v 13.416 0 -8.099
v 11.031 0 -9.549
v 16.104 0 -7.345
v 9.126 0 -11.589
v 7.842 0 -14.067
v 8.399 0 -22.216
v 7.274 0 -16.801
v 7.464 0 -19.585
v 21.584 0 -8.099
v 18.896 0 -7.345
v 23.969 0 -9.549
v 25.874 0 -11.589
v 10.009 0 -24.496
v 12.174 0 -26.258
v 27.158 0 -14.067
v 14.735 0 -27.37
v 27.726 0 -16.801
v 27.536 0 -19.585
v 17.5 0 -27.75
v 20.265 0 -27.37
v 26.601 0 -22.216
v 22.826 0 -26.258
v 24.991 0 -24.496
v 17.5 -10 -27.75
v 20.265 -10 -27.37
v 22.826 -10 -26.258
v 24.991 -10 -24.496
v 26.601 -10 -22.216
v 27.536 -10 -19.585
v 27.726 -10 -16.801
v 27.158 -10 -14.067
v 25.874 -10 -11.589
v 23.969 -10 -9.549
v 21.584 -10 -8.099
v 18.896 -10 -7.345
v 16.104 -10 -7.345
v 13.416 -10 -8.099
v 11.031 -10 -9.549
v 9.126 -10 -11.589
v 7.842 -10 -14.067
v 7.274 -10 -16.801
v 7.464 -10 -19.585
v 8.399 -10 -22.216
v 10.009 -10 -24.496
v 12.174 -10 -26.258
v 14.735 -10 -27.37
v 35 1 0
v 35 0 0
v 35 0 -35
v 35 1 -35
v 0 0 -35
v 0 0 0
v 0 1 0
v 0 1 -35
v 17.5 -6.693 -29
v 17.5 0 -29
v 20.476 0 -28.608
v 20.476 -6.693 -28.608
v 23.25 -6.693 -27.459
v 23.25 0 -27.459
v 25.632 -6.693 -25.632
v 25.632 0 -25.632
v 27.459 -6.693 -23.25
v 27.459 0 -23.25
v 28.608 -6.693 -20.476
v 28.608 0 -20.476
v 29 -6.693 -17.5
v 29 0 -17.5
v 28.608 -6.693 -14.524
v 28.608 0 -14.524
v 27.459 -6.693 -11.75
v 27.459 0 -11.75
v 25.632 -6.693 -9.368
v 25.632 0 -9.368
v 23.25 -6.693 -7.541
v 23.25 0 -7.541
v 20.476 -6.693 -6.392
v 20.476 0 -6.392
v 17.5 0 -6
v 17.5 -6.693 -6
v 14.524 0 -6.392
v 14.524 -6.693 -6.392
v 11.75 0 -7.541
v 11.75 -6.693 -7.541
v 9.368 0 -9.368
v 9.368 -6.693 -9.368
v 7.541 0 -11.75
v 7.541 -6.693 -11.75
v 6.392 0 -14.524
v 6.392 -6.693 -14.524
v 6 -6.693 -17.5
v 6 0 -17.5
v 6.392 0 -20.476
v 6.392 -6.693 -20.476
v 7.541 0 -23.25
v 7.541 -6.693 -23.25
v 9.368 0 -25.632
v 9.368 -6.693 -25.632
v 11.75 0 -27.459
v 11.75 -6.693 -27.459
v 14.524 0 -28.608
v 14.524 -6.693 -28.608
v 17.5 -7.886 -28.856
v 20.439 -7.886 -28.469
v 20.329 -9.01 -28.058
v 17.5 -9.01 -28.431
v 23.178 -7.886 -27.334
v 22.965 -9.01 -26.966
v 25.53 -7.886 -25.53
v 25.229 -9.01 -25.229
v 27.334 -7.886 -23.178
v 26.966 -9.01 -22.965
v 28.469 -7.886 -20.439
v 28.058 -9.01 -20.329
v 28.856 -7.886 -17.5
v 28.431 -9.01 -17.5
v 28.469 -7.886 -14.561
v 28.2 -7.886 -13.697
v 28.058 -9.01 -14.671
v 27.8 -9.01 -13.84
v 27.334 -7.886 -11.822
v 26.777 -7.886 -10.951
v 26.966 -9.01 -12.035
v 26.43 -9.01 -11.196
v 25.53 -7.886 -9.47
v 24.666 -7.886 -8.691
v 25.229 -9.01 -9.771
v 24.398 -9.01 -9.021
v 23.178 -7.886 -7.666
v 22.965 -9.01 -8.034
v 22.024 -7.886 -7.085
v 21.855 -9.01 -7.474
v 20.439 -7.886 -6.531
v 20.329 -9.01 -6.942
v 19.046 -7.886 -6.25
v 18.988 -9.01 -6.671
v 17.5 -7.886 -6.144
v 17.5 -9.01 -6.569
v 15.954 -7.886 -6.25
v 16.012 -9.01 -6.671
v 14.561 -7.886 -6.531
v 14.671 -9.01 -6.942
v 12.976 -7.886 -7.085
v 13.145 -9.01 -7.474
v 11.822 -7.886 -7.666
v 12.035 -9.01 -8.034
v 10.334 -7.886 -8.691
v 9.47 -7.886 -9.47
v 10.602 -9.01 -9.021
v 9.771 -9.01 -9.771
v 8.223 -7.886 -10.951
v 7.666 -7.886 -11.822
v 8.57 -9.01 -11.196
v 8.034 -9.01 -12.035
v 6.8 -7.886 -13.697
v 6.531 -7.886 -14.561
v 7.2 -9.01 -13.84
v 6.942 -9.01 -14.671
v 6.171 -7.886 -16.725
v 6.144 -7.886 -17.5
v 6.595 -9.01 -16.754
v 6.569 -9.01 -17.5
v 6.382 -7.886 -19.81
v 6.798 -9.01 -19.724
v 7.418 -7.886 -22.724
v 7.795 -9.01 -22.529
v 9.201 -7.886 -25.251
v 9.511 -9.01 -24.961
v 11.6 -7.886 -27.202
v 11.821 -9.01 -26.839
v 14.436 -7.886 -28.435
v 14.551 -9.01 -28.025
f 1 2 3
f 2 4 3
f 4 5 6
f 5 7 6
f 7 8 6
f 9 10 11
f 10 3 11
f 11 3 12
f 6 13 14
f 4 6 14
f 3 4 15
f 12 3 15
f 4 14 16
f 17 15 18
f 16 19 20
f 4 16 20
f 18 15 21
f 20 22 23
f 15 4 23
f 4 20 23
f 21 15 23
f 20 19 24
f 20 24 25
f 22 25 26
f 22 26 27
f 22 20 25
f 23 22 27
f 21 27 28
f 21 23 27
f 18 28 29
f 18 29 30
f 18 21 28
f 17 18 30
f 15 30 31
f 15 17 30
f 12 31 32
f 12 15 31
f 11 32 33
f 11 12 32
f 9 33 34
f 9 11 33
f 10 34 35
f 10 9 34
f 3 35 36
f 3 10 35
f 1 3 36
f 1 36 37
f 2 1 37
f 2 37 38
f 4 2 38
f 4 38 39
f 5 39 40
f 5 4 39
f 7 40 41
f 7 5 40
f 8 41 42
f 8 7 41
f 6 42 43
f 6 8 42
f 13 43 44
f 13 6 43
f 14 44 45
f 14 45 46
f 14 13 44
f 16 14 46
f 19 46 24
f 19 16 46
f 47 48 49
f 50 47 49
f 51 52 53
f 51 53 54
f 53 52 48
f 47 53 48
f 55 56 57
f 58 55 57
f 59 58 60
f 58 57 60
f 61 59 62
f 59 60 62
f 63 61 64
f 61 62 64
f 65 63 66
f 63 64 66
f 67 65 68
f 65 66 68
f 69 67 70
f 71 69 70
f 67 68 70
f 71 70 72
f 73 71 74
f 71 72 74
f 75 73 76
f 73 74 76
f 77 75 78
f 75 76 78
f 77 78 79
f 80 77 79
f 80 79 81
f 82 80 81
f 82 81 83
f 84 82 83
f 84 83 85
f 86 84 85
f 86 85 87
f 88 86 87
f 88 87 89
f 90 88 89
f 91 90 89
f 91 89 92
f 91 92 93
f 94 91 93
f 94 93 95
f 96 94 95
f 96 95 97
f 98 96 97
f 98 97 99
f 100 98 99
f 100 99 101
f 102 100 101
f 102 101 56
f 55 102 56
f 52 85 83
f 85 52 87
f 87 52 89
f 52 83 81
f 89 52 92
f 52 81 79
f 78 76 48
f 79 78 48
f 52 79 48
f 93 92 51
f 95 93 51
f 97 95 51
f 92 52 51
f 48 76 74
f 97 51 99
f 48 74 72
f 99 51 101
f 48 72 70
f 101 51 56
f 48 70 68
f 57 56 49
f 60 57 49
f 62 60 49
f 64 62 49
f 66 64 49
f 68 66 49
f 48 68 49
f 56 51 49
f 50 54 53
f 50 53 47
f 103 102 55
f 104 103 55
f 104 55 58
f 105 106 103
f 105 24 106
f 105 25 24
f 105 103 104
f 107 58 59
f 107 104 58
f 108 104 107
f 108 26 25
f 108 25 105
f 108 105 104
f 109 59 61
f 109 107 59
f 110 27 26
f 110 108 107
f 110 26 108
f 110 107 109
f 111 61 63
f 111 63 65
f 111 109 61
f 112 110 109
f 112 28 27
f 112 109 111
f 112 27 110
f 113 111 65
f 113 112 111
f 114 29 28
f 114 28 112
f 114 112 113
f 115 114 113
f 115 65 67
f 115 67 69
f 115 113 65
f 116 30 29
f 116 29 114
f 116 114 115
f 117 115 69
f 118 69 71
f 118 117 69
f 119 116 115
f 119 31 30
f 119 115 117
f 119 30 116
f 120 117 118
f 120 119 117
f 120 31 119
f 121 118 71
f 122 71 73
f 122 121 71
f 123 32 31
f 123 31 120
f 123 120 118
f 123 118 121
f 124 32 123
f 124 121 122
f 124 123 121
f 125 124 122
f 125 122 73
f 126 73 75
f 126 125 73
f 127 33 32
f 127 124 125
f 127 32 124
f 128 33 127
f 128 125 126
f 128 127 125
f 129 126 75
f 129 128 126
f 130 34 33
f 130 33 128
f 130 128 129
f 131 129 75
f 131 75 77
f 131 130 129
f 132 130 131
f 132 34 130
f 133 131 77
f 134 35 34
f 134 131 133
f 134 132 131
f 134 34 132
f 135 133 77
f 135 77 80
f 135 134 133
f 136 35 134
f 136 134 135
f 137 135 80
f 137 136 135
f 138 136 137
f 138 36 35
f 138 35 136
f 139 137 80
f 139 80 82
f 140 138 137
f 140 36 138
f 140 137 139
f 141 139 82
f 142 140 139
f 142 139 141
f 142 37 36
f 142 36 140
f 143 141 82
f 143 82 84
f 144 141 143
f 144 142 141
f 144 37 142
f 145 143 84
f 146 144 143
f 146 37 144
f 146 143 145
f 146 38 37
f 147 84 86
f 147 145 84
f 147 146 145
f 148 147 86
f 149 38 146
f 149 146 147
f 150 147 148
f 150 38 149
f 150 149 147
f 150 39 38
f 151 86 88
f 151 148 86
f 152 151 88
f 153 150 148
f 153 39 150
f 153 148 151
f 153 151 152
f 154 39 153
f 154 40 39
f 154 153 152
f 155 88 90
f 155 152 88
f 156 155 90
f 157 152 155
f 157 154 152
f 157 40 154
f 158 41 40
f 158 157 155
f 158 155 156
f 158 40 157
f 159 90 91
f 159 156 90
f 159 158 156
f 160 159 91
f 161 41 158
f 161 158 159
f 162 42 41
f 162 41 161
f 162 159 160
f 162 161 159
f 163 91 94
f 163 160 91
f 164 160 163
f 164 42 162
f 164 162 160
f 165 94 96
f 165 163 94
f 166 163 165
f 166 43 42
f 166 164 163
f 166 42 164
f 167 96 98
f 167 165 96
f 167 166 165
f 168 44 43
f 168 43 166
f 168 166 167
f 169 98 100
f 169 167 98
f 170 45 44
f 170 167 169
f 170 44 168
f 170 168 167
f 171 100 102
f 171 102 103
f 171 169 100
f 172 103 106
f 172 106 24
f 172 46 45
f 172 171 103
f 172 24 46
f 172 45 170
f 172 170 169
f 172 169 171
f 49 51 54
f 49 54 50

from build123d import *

# Parameters (mm, degrees)
SKETCH1_W           = 35
SKETCH1_H           = 35
BOSS_EXTRUDE1_DEPTH = 1
SKETCH3_R           = 11.5
SKETCH3_R_2         = 10.25
BOSS_EXTRUDE3_DEPTH = 10
FILLET1_R           = 5


with BuildPart() as part:
    # Sketch1 → Boss-Extrude1 (new body)
    with BuildSketch(Plane(origin=(0, 0, 0), x_dir=(1, 0, 0), z_dir=(0, 1, 0))):
        with Locations((17.5, 17.5)):
            Rectangle(SKETCH1_W, SKETCH1_H)
    extrude(amount=BOSS_EXTRUDE1_DEPTH)

    # Sketch3 → Boss-Extrude3 (add)
    with BuildSketch(Plane.XZ):
        with Locations(Location((17.5, -17.5, 0), (0, 0, 270))):
            Circle(SKETCH3_R)
        with Locations(Location((17.5, -17.5, 0), (0, 0, 270))):
            Circle(SKETCH3_R_2, mode=Mode.SUBTRACT)
    extrude(amount=BOSS_EXTRUDE3_DEPTH)

    # Fillet1
    # the kernel refuses this fillet: 5 mm, written as the material it takes off along each edge
    with BuildSketch(Plane(origin=(17.5, -10, -17.5), x_dir=(0, 0, -1), z_dir=(-1, 0, 0))) as fillet1_piece_1:
        with BuildLine():
            CenterArc((6.5, -3.307189139), FILLET1_R, 0, 41.409622109)
            Line((10.25, 0), (10.325, 0.066143783))
            ThreePointArc((10.325, 0.066143783), (10.875, 0.1), (11.5, 0.1))
            Line((11.5, 0.1), (11.6, 0))
            Line((11.6, 0), (11.6, -3.307189139))
            Line((11.6, -3.307189139), (11.5, -3.307189139))
        make_face()
    revolve(axis=Axis((17.5, -10, -17.5), (0, -1, 0)), mode=Mode.SUBTRACT)


solid = part.part
